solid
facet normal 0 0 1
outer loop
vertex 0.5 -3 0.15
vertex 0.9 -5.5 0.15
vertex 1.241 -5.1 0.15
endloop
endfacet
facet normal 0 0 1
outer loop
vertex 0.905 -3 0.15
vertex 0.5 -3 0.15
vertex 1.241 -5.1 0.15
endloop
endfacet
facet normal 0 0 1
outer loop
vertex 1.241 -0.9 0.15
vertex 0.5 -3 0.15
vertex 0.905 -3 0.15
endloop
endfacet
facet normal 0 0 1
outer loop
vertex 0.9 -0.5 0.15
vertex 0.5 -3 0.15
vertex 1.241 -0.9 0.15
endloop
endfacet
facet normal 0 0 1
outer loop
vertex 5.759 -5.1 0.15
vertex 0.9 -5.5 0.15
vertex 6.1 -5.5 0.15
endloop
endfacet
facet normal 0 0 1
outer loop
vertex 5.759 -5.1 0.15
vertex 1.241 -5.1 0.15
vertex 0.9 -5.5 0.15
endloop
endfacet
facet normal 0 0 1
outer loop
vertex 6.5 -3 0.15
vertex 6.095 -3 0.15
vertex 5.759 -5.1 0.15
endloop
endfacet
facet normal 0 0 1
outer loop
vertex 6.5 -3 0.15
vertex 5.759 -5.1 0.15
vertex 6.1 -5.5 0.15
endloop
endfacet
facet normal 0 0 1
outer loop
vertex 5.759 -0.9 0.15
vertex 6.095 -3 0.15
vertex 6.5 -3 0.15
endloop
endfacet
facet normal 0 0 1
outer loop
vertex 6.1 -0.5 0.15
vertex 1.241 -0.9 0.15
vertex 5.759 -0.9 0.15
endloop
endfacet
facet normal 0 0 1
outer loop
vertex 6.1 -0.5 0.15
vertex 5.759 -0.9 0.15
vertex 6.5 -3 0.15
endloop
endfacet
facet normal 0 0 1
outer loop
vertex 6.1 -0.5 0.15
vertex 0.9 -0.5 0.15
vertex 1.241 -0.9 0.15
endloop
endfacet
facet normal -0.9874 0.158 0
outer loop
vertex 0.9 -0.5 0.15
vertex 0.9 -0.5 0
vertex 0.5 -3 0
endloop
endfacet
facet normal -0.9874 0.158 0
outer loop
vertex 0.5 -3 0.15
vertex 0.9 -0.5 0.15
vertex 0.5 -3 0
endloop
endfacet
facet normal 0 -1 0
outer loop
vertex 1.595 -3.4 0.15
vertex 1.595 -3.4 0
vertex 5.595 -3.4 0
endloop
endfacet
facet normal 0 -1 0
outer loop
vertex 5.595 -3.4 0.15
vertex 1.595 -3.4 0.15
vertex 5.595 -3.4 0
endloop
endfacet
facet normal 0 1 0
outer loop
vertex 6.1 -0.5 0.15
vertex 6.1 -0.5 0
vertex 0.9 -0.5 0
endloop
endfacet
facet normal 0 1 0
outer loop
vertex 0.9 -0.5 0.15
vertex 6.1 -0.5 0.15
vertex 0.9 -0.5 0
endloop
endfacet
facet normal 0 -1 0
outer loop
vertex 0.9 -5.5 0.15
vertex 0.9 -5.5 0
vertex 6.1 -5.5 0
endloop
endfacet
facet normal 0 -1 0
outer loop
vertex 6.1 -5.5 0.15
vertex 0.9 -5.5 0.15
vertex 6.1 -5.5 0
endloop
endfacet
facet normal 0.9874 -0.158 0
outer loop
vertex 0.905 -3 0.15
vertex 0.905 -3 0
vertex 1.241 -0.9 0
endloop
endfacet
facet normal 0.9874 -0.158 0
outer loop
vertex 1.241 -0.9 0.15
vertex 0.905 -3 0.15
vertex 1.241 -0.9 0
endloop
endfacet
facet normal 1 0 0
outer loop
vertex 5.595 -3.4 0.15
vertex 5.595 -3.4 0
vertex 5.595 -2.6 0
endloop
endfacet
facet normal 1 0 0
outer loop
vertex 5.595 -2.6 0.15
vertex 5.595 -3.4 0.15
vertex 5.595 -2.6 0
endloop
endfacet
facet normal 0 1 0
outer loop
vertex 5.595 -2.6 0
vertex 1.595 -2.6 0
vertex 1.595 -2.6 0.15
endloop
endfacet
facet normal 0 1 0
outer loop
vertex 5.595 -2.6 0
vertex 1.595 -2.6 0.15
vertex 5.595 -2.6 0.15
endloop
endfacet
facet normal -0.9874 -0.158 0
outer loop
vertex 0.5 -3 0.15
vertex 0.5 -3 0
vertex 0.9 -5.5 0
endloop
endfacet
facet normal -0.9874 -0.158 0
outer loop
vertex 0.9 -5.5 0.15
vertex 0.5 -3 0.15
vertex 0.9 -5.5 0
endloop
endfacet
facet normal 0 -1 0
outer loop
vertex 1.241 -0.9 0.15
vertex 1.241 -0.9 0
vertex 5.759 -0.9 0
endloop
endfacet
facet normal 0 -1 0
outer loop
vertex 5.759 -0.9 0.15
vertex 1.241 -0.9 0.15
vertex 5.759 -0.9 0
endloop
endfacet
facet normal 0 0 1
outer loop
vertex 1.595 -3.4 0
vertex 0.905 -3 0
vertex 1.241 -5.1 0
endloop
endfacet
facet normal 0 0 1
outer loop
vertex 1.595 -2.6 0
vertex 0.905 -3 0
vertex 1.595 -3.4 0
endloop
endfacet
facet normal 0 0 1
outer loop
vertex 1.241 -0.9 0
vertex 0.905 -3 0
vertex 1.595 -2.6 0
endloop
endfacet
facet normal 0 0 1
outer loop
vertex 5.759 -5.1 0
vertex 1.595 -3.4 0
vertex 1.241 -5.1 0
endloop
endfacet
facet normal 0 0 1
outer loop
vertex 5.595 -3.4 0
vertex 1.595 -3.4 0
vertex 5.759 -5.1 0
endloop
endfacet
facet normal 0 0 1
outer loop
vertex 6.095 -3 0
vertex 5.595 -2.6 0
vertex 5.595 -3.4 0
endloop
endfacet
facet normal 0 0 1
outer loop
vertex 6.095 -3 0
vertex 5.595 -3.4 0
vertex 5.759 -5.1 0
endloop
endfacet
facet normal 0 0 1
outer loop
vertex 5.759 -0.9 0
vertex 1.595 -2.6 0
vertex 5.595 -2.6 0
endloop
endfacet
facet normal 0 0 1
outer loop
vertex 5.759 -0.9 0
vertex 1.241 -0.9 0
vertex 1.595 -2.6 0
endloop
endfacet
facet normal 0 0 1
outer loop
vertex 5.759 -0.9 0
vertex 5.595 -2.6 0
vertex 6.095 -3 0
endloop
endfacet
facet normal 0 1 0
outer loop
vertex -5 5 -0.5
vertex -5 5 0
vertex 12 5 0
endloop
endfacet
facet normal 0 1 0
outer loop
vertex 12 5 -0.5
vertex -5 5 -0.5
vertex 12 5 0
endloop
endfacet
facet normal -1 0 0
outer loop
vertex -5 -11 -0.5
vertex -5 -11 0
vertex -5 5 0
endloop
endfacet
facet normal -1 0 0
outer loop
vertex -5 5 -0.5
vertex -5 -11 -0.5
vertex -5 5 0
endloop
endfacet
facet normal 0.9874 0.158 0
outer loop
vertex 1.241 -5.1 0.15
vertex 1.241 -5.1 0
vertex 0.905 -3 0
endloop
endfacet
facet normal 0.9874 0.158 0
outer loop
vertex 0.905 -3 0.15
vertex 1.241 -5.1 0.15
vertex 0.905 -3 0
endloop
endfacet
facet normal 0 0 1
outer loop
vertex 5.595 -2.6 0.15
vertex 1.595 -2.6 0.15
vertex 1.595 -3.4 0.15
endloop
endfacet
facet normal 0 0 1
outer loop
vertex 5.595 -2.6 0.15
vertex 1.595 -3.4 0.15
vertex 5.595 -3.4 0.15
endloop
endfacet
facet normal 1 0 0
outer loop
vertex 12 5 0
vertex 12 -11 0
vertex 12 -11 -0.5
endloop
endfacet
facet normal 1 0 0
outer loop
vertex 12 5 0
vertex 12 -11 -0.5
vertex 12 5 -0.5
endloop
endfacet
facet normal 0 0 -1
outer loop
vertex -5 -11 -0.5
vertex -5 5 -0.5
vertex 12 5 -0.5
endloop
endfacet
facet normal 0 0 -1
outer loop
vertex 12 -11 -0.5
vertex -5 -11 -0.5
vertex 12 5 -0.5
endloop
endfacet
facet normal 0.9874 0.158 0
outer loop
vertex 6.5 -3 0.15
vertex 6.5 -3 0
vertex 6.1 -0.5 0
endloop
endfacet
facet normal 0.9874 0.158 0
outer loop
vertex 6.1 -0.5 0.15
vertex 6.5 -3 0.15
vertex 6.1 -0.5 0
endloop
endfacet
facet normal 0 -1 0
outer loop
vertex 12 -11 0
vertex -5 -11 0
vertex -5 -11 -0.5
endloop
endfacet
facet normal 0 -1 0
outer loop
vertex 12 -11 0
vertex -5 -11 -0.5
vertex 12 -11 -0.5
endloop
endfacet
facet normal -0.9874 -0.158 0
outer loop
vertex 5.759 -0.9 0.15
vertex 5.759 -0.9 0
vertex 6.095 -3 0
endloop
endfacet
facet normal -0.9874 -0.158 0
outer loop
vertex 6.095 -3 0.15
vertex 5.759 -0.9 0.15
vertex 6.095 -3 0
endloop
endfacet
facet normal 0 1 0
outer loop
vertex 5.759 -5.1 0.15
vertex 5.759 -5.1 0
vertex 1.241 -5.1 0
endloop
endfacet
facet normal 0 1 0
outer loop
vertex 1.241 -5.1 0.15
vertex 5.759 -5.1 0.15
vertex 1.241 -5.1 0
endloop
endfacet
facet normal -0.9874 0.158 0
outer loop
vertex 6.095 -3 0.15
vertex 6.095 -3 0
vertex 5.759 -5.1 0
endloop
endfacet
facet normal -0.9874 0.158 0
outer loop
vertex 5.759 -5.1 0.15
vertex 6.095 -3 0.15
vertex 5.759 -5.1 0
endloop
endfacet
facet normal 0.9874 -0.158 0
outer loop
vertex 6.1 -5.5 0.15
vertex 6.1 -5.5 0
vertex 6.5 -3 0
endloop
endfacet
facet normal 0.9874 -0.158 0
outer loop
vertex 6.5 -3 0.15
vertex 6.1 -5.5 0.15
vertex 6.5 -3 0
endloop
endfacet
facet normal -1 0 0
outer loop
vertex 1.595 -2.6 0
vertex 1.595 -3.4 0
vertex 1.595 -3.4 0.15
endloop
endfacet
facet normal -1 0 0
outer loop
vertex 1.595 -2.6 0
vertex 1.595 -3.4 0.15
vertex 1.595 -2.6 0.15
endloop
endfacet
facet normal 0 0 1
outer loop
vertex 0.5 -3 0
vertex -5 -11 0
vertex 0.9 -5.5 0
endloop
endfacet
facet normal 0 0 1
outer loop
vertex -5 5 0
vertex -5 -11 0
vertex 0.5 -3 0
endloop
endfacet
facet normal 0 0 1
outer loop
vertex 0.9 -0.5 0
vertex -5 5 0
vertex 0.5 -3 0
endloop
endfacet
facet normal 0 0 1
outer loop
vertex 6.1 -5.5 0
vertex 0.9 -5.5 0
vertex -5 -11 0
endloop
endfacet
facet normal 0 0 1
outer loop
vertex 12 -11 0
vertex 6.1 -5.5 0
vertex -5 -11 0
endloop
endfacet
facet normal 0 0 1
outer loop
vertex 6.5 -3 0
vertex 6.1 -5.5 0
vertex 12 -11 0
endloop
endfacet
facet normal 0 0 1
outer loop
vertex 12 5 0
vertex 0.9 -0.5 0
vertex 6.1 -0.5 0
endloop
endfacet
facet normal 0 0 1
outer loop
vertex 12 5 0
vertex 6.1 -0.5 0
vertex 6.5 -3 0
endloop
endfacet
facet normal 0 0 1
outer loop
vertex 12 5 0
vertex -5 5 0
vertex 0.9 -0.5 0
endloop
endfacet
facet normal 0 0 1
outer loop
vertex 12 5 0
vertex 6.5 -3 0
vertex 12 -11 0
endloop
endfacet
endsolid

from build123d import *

# Parameters (mm, degrees)
F2_DEPTH  = 0.15
F0_W      = 4
F0_H      = 0.8
F0_W_2    = 7
F0_H_2    = 6
F2_FACE_W = 4
F2_FACE_H = 0.8
F1_W      = 17
F1_H      = 16
F3_DEPTH  = 0.5


with BuildPart() as f2:
    # F0 (on Top) → F2 (new body)
    with BuildSketch(Plane.XY):
        Polygon((0.9, -0.5), (0.5, -3), (0.9, -5.5), (6.1, -5.5), (6.5, -3), (6.1, -0.5), align=None)
        Polygon((1.2410876448, -5.1), (0.9050876448, -3), (1.2410876448, -0.9), (5.7589123552, -0.9), (6.0949123552, -3), (5.7589123552, -5.1), align=None, mode=Mode.SUBTRACT)
    extrude(amount=F2_DEPTH)



with BuildPart() as f2b:
    # F0 (on Top) → F2, piece 2 (new body)
    with BuildSketch(Plane.XY):
        with Locations((3.5949123552, -3)):
            Rectangle(F0_W, F0_H)
    extrude(amount=F2_DEPTH)


with BuildPart() as f2_1:
    add(f2.part)

    add(f2b.part)  # F3 merges F2b
    # F0 (on Top) + F2_face (on face) + F1 (on Top) → F3 (join)
    with BuildSketch(Plane.XY):
        with Locations((3.5, -3)):
            Rectangle(F0_W_2, F0_H_2)
        Polygon((0.9, -5.5), (0.5, -3), (0.9, -0.5), (6.1, -0.5), (6.5, -3), (6.1, -5.5), align=None, mode=Mode.SUBTRACT)
        Polygon((0.9, -0.5), (0.5, -3), (0.9, -5.5), (6.1, -5.5), (6.5, -3), (6.1, -0.5), align=None)
        Polygon((1.2410876448, -5.1), (0.9050876448, -3), (1.2410876448, -0.9), (5.7589123552, -0.9), (6.0949123552, -3), (5.7589123552, -5.1), align=None, mode=Mode.SUBTRACT)
        Polygon((1.2410876448, -0.9), (0.9050876448, -3), (1.2410876448, -5.1), (5.7589123552, -5.1), (6.0949123552, -3), (5.7589123552, -0.9), align=None)
        with Locations((3.5949123552, -3)):
            Rectangle(F0_W, F0_H, mode=Mode.SUBTRACT)
        with Locations((3.5949123552, -3)):
            Rectangle(F0_W, F0_H)
    with BuildSketch(Plane(origin=(3.5949123552, -3, 0), x_dir=(1, 0, 0), z_dir=(0, 0, -1))):
        Rectangle(F2_FACE_W, F2_FACE_H)
    with BuildSketch(Plane.XY):
        with Locations((3.5, -3)):
            Rectangle(F1_W, F1_H)
    extrude(amount=-F3_DEPTH, dir=(0, 0, 1))


solid = f2_1.part
